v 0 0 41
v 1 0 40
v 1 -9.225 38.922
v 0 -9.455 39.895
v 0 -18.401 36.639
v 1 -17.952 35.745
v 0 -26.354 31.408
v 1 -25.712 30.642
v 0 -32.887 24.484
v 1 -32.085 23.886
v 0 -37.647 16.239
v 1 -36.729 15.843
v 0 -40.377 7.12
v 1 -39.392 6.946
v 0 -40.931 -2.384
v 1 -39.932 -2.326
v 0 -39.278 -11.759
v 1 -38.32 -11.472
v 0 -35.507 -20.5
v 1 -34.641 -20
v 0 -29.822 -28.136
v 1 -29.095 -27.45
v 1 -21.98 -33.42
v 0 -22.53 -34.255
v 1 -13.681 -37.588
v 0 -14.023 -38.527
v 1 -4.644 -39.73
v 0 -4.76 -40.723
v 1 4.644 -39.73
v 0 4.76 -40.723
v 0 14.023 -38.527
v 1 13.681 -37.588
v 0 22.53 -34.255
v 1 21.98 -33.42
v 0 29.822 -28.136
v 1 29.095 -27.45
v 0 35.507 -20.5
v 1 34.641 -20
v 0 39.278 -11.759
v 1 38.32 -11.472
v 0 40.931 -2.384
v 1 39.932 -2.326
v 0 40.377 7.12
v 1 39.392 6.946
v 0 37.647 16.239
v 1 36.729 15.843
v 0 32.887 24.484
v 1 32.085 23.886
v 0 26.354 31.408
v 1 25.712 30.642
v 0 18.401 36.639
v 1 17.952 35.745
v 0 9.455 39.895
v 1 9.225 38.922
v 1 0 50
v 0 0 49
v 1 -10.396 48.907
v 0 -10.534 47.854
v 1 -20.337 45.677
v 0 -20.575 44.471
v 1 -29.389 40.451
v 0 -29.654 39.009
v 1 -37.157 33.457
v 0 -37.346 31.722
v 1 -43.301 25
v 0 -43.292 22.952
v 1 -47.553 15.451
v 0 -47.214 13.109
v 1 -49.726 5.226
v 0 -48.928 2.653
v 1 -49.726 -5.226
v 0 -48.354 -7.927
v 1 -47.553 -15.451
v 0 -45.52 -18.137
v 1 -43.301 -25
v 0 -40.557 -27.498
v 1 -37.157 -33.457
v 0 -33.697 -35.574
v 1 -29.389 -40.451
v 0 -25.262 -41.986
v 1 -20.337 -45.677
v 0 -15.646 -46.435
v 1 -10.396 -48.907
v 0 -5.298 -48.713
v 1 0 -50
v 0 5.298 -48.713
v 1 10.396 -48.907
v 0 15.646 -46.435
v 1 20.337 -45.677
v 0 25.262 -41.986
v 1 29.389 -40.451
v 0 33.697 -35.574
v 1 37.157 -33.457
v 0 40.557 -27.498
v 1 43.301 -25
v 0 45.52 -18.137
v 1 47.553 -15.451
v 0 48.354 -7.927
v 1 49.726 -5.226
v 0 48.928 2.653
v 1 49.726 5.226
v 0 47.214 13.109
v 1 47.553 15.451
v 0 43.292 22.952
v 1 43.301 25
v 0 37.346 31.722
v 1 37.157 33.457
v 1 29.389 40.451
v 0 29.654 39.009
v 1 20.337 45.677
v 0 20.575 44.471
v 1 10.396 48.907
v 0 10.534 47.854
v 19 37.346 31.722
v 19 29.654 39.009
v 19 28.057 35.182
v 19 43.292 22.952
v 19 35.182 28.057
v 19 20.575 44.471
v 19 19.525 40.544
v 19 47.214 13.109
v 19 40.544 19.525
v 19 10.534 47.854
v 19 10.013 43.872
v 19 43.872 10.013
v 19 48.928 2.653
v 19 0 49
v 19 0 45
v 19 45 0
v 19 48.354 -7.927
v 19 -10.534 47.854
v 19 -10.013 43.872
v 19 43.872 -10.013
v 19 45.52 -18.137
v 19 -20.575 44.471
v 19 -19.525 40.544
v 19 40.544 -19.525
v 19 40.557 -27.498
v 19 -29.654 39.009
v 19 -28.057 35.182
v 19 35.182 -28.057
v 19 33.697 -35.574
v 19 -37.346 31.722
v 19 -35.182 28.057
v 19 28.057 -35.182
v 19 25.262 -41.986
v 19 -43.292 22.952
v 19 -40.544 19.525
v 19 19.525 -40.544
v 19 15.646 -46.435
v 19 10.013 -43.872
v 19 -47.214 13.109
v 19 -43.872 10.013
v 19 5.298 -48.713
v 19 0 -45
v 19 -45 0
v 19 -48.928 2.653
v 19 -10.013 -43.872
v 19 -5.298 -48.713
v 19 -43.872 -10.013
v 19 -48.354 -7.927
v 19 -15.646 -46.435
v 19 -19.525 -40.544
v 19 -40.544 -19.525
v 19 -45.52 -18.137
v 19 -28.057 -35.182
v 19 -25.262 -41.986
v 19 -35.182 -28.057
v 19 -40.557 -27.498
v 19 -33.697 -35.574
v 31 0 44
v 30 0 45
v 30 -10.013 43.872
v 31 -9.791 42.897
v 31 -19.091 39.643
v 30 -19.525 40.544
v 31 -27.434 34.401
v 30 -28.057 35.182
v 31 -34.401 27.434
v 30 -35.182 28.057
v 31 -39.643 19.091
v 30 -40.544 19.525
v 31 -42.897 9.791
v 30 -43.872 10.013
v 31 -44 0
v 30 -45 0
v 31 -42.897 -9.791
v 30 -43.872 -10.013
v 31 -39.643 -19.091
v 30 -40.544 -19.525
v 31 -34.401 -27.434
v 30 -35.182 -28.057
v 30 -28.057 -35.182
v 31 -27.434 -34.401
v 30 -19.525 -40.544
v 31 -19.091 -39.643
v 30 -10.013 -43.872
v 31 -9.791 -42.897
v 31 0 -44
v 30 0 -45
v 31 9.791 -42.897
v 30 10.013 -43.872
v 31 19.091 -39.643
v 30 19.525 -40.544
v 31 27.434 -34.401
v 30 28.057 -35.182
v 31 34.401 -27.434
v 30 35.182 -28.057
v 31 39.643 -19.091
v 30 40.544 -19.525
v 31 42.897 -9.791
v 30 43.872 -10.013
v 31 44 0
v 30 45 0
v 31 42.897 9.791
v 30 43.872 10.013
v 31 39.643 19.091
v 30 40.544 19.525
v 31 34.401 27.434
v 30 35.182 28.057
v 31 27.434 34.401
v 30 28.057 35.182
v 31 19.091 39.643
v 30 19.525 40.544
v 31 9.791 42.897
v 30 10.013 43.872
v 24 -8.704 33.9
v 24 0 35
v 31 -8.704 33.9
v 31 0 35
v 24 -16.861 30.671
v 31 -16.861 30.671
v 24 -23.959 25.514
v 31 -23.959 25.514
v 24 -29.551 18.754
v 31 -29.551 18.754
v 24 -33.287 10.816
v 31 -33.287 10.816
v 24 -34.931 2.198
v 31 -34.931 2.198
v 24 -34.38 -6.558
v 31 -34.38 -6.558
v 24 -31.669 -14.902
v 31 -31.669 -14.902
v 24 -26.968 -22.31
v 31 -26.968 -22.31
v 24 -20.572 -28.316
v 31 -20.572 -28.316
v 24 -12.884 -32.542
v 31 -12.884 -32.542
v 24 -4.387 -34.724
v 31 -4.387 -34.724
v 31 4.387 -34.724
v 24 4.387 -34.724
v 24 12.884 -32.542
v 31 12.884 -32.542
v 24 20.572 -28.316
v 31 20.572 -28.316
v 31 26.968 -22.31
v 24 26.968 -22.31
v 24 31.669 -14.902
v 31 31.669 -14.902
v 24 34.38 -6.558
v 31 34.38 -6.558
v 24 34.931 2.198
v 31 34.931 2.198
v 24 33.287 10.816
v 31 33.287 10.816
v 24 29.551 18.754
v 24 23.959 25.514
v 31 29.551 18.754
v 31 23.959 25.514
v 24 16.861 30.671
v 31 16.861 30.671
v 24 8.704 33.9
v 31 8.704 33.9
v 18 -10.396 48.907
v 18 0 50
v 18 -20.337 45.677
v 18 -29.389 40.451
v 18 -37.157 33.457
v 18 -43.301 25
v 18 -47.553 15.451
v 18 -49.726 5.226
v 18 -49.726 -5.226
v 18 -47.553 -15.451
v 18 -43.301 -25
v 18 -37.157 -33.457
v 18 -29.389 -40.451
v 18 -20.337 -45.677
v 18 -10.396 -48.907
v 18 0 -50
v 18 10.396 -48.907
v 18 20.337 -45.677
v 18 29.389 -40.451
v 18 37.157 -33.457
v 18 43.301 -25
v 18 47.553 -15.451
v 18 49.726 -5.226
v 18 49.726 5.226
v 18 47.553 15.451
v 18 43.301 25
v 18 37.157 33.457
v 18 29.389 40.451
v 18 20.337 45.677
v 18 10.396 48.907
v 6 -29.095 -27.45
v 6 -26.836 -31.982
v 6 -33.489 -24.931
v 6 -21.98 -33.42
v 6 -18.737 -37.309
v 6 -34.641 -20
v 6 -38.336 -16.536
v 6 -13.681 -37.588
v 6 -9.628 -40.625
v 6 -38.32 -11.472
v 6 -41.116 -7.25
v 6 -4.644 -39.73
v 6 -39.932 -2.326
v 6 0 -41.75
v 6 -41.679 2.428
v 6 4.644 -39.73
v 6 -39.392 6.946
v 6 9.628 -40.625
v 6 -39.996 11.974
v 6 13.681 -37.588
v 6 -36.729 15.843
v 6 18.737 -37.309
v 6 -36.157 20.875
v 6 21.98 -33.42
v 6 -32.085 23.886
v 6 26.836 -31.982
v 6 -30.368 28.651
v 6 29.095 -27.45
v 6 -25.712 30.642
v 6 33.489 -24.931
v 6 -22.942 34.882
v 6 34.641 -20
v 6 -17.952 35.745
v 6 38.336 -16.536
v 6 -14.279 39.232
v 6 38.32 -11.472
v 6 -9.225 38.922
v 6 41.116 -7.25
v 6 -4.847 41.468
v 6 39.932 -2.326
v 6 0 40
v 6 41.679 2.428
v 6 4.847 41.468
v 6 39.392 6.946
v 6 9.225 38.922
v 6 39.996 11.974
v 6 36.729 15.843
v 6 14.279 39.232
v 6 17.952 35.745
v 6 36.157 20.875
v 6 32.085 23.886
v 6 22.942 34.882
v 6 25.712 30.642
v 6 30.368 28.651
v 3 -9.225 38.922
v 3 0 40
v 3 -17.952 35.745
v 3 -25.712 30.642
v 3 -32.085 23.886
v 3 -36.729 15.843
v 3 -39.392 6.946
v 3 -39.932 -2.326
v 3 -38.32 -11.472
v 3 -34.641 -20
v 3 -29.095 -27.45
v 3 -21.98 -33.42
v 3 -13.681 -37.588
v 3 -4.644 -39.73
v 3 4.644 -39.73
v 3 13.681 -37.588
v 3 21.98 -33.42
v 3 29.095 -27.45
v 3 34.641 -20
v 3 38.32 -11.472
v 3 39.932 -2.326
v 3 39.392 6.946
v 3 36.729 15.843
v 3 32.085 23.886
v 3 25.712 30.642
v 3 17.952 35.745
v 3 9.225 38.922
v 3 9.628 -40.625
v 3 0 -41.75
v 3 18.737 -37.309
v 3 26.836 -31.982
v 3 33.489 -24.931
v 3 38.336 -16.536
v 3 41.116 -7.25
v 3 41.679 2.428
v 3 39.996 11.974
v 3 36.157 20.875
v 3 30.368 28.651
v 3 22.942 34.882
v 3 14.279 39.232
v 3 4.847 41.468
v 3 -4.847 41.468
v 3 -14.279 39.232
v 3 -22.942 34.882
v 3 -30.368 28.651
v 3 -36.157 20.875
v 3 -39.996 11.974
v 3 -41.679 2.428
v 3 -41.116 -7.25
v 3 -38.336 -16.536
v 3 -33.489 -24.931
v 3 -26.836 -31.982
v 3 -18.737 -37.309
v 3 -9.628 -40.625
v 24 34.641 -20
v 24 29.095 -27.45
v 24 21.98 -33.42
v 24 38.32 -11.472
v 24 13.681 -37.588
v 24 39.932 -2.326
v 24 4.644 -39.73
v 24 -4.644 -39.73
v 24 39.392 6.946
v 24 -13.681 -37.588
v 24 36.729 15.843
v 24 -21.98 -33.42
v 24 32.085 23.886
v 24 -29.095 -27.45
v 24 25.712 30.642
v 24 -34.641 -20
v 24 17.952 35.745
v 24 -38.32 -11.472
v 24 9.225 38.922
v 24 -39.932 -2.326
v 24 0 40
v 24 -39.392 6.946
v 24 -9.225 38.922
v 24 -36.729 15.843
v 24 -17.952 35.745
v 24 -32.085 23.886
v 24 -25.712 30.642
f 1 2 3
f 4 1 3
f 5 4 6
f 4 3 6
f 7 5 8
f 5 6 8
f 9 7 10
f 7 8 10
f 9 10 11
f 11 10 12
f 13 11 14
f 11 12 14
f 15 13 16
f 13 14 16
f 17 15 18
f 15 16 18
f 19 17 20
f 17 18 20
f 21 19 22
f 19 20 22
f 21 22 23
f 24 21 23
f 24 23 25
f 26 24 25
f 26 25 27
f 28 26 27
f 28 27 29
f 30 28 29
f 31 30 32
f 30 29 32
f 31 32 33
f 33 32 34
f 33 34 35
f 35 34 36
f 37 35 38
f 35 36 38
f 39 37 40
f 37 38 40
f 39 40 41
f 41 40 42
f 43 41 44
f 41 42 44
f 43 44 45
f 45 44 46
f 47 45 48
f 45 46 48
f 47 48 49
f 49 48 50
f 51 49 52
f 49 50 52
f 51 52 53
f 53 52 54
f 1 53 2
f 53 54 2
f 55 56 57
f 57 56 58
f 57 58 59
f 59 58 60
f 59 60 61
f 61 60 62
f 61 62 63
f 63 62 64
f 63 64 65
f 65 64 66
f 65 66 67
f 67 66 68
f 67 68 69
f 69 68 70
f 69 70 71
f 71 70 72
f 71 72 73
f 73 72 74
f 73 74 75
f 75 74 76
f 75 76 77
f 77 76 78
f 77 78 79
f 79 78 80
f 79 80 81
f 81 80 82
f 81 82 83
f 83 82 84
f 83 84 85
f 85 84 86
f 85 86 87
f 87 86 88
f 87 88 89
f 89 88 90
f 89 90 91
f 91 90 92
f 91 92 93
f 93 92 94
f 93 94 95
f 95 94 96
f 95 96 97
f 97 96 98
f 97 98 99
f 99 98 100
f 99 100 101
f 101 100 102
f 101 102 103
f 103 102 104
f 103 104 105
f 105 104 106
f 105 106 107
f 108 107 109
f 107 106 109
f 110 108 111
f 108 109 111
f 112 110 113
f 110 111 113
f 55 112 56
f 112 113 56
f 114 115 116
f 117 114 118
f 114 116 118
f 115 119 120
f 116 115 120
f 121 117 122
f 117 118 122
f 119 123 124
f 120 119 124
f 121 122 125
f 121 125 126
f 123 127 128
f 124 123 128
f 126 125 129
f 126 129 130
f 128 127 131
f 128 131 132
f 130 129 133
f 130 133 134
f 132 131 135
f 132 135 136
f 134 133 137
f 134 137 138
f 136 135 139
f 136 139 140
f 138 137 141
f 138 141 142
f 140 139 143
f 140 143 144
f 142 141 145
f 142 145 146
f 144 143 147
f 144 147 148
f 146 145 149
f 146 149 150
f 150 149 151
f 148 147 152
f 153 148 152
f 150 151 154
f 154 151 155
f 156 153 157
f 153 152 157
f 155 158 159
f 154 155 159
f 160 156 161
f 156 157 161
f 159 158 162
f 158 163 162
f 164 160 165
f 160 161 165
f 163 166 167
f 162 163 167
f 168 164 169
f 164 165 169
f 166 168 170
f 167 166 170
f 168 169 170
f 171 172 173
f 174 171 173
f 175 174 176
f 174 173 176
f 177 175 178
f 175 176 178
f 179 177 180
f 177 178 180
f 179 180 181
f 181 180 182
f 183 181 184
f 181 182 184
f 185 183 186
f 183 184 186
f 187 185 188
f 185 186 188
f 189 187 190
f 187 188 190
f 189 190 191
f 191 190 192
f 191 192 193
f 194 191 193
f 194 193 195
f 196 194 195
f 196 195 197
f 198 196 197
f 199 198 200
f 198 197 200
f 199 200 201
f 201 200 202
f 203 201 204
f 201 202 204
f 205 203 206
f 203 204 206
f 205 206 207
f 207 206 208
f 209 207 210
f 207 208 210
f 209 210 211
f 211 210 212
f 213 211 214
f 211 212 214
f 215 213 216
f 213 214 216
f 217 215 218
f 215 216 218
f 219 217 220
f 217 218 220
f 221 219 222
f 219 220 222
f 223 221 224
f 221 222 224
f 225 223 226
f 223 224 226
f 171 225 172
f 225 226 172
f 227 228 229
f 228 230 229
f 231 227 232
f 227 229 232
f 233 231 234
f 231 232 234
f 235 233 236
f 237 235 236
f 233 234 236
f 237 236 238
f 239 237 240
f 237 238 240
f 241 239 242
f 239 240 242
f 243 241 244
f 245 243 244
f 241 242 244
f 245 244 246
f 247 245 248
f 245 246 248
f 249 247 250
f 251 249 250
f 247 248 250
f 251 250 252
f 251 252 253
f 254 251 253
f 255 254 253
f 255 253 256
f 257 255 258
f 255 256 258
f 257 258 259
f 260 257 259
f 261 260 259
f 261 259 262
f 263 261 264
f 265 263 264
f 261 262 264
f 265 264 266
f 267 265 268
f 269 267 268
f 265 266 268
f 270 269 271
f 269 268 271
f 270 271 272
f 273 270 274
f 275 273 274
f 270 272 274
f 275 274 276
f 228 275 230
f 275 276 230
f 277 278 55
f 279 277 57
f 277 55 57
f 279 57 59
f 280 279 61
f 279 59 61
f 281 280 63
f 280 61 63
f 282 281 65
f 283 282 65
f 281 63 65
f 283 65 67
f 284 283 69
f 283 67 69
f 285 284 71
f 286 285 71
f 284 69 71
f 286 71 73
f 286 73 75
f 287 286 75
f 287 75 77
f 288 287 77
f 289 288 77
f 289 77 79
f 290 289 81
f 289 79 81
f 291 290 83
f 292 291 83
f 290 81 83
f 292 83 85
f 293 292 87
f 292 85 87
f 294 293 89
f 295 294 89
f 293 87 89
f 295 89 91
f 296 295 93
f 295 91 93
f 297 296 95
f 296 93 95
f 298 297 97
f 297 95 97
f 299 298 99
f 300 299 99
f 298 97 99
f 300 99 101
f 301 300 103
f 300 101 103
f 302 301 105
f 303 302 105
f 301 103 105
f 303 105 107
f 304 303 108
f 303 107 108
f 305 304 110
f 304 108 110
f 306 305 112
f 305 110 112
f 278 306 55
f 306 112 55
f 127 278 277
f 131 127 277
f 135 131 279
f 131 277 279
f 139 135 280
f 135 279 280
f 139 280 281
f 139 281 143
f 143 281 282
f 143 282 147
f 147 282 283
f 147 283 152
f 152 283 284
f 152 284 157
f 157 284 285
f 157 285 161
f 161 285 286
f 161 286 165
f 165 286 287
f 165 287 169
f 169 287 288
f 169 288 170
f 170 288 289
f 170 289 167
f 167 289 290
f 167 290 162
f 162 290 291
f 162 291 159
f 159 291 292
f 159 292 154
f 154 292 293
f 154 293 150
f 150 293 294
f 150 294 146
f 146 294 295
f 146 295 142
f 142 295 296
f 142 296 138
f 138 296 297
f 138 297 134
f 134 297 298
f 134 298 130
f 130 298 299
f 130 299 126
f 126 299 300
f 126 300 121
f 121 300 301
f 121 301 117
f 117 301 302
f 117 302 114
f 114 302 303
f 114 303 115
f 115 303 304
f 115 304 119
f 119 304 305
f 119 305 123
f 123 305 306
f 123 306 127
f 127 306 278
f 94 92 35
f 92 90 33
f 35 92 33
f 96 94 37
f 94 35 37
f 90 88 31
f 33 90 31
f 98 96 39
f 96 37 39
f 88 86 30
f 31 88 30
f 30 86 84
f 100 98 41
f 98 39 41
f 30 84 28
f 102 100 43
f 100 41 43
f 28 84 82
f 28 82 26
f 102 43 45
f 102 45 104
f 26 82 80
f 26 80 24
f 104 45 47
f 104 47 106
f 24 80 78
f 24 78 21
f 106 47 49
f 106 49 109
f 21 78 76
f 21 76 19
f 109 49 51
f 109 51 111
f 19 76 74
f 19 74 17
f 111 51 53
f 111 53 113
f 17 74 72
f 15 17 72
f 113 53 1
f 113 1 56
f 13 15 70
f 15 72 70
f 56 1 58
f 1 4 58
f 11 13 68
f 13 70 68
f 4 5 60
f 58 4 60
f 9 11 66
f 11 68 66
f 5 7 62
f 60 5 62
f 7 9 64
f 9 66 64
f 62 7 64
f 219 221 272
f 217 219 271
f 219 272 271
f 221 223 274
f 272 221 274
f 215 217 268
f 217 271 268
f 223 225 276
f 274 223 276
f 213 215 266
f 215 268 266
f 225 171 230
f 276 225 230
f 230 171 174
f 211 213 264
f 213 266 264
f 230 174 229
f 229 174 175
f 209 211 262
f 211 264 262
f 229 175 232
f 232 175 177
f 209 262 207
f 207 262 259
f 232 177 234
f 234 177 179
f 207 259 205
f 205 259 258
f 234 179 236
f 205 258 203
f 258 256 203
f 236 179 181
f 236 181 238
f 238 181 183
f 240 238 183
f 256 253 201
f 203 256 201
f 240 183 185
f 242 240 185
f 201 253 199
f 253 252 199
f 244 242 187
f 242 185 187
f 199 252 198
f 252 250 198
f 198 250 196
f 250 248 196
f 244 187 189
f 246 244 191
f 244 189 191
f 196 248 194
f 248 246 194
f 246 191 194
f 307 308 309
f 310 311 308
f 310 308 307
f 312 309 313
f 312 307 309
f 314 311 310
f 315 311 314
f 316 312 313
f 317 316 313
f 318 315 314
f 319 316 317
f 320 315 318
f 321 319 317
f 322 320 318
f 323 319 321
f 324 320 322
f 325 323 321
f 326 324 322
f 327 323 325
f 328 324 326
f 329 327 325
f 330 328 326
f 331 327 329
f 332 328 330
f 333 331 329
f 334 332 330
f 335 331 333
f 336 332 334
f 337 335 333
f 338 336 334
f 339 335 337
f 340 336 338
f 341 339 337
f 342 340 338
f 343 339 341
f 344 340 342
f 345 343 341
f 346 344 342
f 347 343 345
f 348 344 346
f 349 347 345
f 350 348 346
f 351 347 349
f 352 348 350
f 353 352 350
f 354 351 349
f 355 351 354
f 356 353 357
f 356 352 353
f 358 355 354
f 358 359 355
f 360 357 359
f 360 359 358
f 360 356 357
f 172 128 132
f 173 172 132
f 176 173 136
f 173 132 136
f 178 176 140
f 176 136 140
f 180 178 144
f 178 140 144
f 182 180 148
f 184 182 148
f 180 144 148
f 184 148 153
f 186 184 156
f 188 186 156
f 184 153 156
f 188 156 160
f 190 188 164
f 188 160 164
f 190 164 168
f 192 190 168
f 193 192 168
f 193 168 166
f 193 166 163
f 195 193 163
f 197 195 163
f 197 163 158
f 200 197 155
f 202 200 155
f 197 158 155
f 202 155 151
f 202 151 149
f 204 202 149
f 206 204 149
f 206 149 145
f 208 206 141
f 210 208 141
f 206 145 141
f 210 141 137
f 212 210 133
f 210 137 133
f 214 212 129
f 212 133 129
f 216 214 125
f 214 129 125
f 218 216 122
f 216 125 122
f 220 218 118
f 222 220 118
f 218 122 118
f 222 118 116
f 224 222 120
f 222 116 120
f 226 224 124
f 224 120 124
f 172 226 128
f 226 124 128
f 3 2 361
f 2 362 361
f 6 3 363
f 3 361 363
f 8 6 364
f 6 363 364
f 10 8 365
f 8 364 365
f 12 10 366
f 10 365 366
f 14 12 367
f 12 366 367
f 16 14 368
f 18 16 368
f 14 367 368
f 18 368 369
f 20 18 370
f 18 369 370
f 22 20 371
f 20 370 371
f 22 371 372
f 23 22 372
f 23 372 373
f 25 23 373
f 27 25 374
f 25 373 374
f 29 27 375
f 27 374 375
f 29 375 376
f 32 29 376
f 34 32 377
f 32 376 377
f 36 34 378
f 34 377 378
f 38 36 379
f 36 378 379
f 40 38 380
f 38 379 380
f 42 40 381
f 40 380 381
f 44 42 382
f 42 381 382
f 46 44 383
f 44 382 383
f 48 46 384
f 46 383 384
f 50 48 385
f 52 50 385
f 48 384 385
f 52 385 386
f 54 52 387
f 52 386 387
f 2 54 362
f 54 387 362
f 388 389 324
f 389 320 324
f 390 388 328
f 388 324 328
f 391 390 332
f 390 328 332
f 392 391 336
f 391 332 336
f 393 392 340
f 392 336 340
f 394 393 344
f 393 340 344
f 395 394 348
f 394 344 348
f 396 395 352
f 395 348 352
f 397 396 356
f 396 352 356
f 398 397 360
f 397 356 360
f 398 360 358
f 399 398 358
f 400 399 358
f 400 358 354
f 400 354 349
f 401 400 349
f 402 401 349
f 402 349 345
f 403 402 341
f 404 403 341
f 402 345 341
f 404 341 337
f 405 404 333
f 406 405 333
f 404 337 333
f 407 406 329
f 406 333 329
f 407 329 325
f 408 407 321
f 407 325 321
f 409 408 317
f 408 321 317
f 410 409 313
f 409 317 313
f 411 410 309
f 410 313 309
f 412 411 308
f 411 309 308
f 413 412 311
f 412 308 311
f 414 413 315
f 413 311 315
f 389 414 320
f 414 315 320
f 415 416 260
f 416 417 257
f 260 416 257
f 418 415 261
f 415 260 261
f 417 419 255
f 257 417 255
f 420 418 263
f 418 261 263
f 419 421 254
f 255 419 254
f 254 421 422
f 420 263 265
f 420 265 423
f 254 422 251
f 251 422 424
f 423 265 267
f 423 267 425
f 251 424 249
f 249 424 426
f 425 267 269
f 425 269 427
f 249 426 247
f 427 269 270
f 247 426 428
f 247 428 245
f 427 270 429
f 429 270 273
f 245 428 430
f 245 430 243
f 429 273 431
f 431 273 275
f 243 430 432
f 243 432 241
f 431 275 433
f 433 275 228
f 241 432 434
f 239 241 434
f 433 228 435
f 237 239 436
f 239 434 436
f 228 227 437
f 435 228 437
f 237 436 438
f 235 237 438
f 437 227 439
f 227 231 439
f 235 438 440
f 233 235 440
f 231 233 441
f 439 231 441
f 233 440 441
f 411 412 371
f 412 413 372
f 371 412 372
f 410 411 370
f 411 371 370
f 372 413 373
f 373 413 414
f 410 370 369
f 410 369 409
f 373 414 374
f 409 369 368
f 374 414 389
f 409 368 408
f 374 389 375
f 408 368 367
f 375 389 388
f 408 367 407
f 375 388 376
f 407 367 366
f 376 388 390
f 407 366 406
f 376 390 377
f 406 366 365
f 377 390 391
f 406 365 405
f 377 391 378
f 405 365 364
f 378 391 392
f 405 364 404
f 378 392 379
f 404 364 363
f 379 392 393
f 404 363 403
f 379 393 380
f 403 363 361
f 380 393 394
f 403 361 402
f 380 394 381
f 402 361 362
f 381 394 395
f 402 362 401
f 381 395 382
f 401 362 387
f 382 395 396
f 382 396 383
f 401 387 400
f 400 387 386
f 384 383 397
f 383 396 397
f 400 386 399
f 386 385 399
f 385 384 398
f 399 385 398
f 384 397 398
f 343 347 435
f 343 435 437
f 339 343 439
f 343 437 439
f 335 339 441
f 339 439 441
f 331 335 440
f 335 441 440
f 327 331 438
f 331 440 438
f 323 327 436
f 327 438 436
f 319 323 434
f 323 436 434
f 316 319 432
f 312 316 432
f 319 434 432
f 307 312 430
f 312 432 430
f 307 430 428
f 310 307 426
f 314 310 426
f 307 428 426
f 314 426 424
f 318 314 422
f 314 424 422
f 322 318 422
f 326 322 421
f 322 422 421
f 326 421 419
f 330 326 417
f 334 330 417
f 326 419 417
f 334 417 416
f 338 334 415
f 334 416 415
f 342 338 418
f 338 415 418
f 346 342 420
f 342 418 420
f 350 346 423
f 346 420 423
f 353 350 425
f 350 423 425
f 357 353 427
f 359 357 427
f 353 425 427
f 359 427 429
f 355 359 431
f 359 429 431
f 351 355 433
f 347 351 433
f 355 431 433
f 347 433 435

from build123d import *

# Parameters (mm, degrees)
CHAMFER_1_SIZE = 1
SKETCH_2_W     = 3
SKETCH_2_H     = 41.75


with BuildPart() as part:
    # Эскиз1 → Повернуть1 (revolve)
    with BuildSketch(Plane.XY, mode=Mode.PRIVATE) as revolve_1_sk:
        Polygon((31, 35), (31, 45), (19, 45), (19, 50), (0, 50), (0, 40), (24, 40), (24, 35), align=None)
    revolve(revolve_1_sk.sketch.rotate(Axis((0, 0, 0), (1, 0, 0)), 90), axis=Axis((0, 0, 0), (1, 0, 0)))

    # Фаска1
    chamfer_1_edges = [part.edges().sort_by_distance(p)[0] for p in [
        (31, 0, -45),
        (0, 0, -40),
        (0, 0, -50),
        (19, 0, -50),
    ]]
    chamfer(chamfer_1_edges, length=CHAMFER_1_SIZE)

    # Эскиз2 → Вырез-Повернуть1 (revolve, cut)
    with BuildSketch(Plane.XY, mode=Mode.PRIVATE) as cut_revolve_1_sk:
        with Locations((4.5, 20.875)):
            Rectangle(SKETCH_2_W, SKETCH_2_H)
    revolve(cut_revolve_1_sk.sketch.rotate(Axis((0, 0, 0), (1, 0, 0)), 270), axis=Axis((0, 0, 0), (1, 0, 0)), mode=Mode.SUBTRACT)


solid = part.part
